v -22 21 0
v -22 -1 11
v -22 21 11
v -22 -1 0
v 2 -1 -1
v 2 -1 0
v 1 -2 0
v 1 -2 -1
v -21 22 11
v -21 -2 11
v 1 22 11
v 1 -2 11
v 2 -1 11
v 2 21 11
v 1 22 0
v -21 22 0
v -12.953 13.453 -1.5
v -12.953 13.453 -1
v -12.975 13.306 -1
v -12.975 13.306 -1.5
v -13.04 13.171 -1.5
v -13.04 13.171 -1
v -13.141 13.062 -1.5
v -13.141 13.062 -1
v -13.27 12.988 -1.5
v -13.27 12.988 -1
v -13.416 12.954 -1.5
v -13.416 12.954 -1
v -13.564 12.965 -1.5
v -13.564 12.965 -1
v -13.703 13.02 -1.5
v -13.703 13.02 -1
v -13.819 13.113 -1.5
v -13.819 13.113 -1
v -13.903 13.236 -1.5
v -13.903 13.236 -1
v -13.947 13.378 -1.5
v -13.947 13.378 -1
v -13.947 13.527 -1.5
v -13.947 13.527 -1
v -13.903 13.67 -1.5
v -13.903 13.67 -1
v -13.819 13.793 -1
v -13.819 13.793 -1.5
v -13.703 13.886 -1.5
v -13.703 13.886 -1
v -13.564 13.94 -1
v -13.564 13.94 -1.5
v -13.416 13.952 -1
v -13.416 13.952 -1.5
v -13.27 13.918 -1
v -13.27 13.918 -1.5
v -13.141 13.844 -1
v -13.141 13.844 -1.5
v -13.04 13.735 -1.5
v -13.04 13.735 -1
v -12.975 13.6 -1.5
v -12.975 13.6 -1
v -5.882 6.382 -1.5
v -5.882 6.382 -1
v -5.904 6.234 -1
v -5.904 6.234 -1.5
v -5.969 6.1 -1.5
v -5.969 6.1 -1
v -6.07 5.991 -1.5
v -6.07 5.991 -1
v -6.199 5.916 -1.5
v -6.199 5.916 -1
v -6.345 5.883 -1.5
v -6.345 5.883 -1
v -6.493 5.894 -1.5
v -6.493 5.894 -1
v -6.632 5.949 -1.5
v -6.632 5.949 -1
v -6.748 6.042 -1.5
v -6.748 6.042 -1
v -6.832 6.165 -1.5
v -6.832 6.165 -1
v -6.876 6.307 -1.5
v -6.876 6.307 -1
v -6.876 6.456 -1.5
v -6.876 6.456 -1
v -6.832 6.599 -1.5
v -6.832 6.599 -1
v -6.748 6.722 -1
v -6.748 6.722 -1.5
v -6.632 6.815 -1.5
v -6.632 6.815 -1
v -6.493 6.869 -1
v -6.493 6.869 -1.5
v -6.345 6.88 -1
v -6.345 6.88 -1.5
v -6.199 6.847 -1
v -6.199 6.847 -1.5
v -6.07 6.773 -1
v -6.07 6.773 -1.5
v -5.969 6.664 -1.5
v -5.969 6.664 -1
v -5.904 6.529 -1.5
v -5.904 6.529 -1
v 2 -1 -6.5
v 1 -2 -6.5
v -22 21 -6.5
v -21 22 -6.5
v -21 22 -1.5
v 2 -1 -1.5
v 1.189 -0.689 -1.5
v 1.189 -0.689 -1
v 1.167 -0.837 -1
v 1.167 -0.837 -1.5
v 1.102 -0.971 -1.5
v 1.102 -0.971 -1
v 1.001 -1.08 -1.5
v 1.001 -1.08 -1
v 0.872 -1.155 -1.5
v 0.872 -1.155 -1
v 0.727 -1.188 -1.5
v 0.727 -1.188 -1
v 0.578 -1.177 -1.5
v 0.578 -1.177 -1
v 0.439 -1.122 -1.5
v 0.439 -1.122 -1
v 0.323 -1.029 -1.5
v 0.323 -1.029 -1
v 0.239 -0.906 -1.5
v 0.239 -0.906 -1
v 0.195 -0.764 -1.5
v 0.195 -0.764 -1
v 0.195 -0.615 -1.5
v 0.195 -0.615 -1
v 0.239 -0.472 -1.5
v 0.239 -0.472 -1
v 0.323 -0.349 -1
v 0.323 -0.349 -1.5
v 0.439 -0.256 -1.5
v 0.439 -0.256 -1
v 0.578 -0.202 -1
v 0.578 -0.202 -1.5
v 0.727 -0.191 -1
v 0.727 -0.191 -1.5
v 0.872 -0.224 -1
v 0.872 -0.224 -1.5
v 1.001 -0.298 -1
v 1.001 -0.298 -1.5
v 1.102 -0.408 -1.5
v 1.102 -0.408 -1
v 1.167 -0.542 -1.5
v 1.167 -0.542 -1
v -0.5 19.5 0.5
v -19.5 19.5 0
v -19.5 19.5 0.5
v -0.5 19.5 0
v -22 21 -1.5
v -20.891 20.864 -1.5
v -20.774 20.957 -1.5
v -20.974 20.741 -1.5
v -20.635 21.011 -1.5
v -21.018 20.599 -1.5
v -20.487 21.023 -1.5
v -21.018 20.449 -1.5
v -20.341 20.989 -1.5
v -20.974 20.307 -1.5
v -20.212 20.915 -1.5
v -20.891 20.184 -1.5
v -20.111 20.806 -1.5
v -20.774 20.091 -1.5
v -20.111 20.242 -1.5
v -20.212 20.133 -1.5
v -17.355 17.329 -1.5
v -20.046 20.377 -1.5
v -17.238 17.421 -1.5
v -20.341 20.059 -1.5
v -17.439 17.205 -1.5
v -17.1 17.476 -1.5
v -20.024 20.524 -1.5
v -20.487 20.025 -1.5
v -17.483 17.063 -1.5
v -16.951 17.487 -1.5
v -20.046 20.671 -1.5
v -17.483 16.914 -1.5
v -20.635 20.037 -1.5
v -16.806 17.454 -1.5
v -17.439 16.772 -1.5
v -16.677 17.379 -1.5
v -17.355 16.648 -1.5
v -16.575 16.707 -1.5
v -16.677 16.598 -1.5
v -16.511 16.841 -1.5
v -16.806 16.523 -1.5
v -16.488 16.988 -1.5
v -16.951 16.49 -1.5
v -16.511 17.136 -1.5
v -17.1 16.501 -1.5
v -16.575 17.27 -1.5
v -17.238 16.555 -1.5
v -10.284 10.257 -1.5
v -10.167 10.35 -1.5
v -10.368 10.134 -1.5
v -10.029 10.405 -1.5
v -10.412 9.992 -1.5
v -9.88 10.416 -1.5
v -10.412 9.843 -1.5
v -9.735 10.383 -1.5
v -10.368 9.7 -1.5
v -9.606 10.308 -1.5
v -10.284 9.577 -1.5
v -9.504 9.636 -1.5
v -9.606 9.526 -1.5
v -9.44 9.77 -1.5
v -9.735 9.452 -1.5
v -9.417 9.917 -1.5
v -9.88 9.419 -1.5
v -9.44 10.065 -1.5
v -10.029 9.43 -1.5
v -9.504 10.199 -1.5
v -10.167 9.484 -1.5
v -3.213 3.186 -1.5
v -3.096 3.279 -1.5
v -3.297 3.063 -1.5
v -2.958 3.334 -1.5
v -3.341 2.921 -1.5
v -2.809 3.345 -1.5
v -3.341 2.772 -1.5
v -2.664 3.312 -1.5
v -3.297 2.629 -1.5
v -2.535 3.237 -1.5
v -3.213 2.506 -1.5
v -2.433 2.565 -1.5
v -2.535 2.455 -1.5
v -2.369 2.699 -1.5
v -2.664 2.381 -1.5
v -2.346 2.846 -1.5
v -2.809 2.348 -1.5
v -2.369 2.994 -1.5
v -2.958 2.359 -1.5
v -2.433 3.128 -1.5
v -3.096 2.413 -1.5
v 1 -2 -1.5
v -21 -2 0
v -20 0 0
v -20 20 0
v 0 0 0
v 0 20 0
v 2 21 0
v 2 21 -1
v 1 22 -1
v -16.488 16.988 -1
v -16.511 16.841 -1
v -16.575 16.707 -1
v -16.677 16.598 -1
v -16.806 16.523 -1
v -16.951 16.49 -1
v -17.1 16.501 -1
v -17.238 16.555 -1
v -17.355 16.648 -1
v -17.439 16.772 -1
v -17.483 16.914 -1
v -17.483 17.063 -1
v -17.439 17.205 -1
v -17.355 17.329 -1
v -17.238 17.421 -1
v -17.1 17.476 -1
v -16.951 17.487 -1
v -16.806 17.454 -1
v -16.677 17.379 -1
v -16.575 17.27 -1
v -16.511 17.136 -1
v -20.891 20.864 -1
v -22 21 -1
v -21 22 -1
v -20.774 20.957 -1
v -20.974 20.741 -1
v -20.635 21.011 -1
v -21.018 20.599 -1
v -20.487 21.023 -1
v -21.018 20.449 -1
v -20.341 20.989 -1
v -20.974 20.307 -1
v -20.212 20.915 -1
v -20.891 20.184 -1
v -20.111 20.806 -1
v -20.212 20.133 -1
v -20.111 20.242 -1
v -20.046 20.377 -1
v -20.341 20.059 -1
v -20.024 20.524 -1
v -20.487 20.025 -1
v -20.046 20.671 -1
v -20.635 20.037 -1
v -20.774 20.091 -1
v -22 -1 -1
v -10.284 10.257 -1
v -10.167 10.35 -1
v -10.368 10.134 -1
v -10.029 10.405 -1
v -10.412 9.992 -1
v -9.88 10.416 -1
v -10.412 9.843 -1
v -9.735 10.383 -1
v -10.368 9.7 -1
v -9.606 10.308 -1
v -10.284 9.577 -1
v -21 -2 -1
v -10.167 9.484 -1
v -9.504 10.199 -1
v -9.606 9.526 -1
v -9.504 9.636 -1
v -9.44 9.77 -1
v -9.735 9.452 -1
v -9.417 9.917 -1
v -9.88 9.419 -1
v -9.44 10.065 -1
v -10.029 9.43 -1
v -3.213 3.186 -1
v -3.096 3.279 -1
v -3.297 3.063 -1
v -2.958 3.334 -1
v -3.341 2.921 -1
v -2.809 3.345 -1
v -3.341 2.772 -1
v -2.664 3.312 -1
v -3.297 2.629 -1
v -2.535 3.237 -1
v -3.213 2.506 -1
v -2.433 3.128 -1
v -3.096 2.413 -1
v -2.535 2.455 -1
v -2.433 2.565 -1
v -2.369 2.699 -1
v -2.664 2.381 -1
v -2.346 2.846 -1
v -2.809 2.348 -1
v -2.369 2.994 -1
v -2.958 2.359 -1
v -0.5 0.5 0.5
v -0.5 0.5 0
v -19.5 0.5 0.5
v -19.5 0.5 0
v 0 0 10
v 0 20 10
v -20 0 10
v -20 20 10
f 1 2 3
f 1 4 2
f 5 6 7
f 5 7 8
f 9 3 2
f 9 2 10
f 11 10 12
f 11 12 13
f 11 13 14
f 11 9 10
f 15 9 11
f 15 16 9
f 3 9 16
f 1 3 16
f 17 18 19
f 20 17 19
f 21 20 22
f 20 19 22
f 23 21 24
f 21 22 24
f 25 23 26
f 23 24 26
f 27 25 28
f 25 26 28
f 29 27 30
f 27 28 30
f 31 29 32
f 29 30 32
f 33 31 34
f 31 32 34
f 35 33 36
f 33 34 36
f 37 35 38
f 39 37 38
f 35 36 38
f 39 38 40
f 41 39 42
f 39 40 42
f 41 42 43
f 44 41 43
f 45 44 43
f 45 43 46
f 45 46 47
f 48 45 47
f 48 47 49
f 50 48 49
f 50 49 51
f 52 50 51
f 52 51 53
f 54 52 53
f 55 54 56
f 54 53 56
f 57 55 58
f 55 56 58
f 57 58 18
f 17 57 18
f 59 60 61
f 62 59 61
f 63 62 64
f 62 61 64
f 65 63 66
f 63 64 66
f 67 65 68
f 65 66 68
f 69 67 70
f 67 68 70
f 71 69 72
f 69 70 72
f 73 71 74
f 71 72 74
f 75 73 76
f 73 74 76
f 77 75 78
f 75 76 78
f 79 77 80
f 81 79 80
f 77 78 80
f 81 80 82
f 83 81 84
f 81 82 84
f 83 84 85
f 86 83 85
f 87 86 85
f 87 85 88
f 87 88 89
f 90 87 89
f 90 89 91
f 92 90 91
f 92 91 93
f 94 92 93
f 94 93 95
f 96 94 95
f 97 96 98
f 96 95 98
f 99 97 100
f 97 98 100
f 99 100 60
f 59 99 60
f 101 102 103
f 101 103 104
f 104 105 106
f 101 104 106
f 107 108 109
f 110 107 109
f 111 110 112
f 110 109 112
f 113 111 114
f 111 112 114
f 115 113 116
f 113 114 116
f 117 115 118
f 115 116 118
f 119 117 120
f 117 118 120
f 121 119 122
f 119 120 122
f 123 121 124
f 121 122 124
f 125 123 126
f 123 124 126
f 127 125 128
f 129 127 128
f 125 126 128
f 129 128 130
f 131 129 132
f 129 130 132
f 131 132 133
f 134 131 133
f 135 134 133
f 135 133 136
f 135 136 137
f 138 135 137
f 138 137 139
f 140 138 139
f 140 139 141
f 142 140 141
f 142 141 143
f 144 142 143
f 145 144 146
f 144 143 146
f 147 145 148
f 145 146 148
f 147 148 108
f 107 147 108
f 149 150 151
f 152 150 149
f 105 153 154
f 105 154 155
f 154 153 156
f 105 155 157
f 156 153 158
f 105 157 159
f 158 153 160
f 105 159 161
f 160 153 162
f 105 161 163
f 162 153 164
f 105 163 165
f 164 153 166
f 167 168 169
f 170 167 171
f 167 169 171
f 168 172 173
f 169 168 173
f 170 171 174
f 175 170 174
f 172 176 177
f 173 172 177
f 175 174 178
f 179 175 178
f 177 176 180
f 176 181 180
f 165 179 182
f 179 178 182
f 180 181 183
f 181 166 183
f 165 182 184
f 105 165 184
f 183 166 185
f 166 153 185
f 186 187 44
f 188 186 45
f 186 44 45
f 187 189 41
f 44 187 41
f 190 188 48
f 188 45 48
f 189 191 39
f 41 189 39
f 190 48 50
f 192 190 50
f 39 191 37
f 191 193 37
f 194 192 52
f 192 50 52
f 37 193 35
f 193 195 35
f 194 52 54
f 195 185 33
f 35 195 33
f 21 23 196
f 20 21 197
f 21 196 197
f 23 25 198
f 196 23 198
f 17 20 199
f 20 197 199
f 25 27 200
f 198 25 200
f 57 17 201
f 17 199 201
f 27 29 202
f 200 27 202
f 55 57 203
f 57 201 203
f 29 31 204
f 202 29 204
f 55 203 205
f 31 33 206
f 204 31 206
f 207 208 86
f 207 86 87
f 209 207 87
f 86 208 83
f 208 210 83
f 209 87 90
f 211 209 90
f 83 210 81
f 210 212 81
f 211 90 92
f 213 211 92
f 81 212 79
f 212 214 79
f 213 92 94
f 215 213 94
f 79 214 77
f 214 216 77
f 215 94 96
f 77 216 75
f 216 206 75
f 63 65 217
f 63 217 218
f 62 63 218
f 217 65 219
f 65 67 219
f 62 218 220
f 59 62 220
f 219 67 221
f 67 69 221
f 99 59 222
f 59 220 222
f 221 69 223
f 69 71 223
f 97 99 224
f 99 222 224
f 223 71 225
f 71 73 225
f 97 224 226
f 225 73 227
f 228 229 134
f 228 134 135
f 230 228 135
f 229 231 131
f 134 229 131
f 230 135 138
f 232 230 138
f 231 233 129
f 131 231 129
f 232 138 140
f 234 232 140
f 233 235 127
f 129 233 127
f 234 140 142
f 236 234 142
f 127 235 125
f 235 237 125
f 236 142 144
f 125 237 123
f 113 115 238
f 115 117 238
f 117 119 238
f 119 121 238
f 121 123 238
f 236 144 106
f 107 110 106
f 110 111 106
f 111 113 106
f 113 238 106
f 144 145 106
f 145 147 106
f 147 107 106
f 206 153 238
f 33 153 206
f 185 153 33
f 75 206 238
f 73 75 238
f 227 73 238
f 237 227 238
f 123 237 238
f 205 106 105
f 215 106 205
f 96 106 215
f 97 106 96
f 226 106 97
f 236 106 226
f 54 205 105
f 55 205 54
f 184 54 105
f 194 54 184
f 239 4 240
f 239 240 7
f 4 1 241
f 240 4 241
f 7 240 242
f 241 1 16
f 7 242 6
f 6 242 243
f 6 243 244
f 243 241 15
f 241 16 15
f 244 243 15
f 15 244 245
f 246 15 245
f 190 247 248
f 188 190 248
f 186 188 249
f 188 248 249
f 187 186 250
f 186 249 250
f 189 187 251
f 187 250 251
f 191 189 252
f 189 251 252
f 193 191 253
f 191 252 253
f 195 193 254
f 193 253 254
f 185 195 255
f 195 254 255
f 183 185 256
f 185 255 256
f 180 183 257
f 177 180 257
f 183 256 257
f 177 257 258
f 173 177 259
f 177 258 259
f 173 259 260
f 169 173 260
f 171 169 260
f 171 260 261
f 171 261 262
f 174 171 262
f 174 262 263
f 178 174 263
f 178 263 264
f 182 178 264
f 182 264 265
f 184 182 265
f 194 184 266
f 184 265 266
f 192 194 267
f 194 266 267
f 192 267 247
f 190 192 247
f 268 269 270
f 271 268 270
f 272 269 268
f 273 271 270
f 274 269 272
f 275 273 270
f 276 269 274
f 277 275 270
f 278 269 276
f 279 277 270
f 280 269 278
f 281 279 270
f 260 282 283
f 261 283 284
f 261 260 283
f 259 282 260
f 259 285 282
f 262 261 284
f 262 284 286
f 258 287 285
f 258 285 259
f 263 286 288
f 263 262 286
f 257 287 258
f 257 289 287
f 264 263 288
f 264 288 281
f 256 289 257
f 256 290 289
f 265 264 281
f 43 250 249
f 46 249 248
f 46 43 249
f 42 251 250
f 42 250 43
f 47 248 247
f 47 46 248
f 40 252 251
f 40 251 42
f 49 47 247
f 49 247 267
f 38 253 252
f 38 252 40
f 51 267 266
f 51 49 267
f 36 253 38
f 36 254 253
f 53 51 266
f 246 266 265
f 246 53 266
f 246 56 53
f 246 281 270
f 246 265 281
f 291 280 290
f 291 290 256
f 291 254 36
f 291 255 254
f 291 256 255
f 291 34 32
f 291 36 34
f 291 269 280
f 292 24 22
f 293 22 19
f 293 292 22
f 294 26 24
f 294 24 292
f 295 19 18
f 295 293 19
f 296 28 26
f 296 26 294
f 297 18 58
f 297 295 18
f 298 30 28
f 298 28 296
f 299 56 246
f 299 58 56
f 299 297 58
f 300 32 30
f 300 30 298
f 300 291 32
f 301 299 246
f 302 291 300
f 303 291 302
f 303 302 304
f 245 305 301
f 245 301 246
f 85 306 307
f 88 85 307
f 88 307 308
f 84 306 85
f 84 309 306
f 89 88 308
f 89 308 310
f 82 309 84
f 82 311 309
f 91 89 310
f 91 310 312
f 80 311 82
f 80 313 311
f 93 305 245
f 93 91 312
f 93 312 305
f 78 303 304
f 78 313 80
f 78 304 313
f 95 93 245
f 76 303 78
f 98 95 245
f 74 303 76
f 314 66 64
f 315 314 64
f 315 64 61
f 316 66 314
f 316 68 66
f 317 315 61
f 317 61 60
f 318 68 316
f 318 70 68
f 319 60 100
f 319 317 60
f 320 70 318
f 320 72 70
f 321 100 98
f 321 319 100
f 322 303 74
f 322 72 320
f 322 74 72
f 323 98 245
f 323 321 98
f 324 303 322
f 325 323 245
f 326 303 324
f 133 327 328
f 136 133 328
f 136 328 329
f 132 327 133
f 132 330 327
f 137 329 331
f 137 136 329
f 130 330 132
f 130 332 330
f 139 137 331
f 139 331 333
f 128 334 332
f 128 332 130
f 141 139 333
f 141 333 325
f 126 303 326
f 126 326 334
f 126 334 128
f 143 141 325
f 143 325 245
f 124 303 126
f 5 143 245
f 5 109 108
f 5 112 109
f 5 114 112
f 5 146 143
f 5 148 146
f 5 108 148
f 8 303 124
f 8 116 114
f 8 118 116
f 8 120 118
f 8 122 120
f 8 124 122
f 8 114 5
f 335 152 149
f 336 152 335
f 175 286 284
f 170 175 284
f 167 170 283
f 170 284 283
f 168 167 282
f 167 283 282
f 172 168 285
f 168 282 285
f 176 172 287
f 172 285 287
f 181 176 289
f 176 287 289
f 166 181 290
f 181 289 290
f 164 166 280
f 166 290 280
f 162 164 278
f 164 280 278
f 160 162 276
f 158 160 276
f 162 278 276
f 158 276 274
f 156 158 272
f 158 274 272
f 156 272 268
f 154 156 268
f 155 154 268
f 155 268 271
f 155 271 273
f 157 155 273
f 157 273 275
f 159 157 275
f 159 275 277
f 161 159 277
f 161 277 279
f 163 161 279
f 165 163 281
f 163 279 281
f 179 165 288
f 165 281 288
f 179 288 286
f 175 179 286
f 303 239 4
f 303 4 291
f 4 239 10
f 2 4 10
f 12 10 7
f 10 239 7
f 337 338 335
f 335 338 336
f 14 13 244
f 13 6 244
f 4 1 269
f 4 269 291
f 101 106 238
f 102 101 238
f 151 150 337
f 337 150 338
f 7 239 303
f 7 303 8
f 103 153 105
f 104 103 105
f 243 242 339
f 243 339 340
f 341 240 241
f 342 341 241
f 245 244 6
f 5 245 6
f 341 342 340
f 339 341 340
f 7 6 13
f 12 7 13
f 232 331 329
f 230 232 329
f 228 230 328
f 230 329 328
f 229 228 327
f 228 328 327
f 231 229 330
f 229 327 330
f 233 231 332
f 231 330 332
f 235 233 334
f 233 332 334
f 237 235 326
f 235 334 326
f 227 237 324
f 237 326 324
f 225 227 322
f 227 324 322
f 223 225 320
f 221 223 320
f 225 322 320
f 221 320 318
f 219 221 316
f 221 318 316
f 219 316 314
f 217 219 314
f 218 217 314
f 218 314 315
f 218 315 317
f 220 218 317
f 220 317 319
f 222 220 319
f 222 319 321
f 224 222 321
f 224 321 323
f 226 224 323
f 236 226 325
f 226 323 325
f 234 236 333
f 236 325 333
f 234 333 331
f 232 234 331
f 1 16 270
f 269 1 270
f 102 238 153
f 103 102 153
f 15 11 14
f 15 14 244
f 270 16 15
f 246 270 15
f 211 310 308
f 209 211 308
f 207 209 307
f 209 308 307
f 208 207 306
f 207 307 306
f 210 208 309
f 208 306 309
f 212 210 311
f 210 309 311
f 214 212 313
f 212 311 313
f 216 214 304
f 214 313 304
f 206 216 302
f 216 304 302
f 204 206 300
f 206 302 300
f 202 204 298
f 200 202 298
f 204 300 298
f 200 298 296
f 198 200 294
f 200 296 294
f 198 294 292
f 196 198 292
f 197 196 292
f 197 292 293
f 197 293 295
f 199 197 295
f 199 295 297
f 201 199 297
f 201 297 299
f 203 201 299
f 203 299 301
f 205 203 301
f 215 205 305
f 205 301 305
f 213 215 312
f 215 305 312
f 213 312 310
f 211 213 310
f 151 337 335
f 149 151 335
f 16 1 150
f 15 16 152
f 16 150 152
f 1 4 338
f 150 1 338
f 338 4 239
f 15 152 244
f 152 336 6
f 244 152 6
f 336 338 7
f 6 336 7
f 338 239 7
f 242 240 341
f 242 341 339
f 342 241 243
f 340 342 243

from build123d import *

# Parameters (mm, degrees)
SKETCH_W        = 24
SKETCH_H        = 24
SKETCH_W_2      = 20
SKETCH_H_2      = 20
PAD_DEPTH       = 10
SKETCH001_W     = 24
SKETCH001_H     = 24
PAD001_DEPTH    = 1
CHAMFER_SIZE    = 1
SKETCH002_W     = 24
SKETCH002_H     = 24
PAD002_DEPTH    = 1
SKETCH003_W     = 19
SKETCH003_H     = 19
PAD003_DEPTH    = 0.5
CHAMFER001_SIZE = 1
SKETCH004_R     = 0.5
PAD004_DEPTH    = 0.5
PAD005_DEPTH    = 5


with BuildPart() as box:
    # Sketch → Pad (new body)
    with BuildSketch(Plane.XY):
        with Locations((-10, 10)):
            Rectangle(SKETCH_W, SKETCH_H)
        with Locations((-10, 10)):
            Rectangle(SKETCH_W_2, SKETCH_H_2, mode=Mode.SUBTRACT)
    extrude(amount=PAD_DEPTH)

    # Sketch001 (on Face10 of Pad) → Pad001 (join)
    with BuildSketch(Plane.XY.offset(10)):
        with Locations((-10, 10)):
            Rectangle(SKETCH001_W, SKETCH001_H)
    extrude(amount=PAD001_DEPTH)

    # Chamfer
    chamfer_edges = [box.edges().sort_by_distance(p)[0] for p in [
        (-22, 22, 5),
        (2, 22, 5),
        (2, -2, 5),
        (-22, -2, 5),
    ]]
    chamfer(chamfer_edges, length=CHAMFER_SIZE)


with BuildPart() as cap:
    # Sketch002 (on Face1 of ShapeBinder) → Pad002 (new body)
    with BuildSketch(Plane(origin=(0, 0, 0), x_dir=(1, 0, 0), z_dir=(0, 0, -1))):
        with Locations((-10, -10)):
            Rectangle(SKETCH002_W, SKETCH002_H)
    extrude(amount=PAD002_DEPTH)

    # Sketch003 (on Face1 of ShapeBinder) → Pad003 (join)
    with BuildSketch(Plane(origin=(0, 0, 0), x_dir=(1, 0, 0), z_dir=(0, 0, -1))):
        with Locations((-10, -10)):
            Rectangle(SKETCH003_W, SKETCH003_H)
    extrude(amount=-PAD003_DEPTH)

    # Chamfer001
    chamfer001_edges = [cap.edges().sort_by_distance(p)[0] for p in [
        (2, -2, -0.5),
        (-22, -2, -0.5),
        (-22, 22, -0.5),
        (2, 22, -0.5),
    ]]
    chamfer(chamfer001_edges, length=CHAMFER001_SIZE)

    # Sketch004 (on Face5 of Chamfer001) → Pad004 (join)
    with BuildSketch(Plane(origin=(0, 0, -1), x_dir=(1, 0, 0), z_dir=(0, 0, -1))):
        with Locations((-20.524008, -20.524008)):
            Circle(SKETCH004_R)
        with Locations((-16.988474, -16.988474)):
            Circle(SKETCH004_R)
        with Locations((-13.452941, -13.452941)):
            Circle(SKETCH004_R)
        with Locations((-9.917407, -9.917407)):
            Circle(SKETCH004_R)
        with Locations((-6.381873, -6.381873)):
            Circle(SKETCH004_R)
        with Locations((-2.846339, -2.846339)):
            Circle(SKETCH004_R)
        with Locations((0.689195, 0.689195)):
            Circle(SKETCH004_R)
    extrude(amount=PAD004_DEPTH)

    # Sketch005 (on Face27 of Pad004) → Pad005 (join)
    with BuildSketch(Plane(origin=(0, 0, -1.5), x_dir=(1, 0, 0), z_dir=(0, 0, -1))):
        Polygon((1, 2), (-22, -21), (-21, -22), (2, 1), align=None)
    extrude(amount=PAD005_DEPTH)


solid = Compound([box.part, cap.part])
